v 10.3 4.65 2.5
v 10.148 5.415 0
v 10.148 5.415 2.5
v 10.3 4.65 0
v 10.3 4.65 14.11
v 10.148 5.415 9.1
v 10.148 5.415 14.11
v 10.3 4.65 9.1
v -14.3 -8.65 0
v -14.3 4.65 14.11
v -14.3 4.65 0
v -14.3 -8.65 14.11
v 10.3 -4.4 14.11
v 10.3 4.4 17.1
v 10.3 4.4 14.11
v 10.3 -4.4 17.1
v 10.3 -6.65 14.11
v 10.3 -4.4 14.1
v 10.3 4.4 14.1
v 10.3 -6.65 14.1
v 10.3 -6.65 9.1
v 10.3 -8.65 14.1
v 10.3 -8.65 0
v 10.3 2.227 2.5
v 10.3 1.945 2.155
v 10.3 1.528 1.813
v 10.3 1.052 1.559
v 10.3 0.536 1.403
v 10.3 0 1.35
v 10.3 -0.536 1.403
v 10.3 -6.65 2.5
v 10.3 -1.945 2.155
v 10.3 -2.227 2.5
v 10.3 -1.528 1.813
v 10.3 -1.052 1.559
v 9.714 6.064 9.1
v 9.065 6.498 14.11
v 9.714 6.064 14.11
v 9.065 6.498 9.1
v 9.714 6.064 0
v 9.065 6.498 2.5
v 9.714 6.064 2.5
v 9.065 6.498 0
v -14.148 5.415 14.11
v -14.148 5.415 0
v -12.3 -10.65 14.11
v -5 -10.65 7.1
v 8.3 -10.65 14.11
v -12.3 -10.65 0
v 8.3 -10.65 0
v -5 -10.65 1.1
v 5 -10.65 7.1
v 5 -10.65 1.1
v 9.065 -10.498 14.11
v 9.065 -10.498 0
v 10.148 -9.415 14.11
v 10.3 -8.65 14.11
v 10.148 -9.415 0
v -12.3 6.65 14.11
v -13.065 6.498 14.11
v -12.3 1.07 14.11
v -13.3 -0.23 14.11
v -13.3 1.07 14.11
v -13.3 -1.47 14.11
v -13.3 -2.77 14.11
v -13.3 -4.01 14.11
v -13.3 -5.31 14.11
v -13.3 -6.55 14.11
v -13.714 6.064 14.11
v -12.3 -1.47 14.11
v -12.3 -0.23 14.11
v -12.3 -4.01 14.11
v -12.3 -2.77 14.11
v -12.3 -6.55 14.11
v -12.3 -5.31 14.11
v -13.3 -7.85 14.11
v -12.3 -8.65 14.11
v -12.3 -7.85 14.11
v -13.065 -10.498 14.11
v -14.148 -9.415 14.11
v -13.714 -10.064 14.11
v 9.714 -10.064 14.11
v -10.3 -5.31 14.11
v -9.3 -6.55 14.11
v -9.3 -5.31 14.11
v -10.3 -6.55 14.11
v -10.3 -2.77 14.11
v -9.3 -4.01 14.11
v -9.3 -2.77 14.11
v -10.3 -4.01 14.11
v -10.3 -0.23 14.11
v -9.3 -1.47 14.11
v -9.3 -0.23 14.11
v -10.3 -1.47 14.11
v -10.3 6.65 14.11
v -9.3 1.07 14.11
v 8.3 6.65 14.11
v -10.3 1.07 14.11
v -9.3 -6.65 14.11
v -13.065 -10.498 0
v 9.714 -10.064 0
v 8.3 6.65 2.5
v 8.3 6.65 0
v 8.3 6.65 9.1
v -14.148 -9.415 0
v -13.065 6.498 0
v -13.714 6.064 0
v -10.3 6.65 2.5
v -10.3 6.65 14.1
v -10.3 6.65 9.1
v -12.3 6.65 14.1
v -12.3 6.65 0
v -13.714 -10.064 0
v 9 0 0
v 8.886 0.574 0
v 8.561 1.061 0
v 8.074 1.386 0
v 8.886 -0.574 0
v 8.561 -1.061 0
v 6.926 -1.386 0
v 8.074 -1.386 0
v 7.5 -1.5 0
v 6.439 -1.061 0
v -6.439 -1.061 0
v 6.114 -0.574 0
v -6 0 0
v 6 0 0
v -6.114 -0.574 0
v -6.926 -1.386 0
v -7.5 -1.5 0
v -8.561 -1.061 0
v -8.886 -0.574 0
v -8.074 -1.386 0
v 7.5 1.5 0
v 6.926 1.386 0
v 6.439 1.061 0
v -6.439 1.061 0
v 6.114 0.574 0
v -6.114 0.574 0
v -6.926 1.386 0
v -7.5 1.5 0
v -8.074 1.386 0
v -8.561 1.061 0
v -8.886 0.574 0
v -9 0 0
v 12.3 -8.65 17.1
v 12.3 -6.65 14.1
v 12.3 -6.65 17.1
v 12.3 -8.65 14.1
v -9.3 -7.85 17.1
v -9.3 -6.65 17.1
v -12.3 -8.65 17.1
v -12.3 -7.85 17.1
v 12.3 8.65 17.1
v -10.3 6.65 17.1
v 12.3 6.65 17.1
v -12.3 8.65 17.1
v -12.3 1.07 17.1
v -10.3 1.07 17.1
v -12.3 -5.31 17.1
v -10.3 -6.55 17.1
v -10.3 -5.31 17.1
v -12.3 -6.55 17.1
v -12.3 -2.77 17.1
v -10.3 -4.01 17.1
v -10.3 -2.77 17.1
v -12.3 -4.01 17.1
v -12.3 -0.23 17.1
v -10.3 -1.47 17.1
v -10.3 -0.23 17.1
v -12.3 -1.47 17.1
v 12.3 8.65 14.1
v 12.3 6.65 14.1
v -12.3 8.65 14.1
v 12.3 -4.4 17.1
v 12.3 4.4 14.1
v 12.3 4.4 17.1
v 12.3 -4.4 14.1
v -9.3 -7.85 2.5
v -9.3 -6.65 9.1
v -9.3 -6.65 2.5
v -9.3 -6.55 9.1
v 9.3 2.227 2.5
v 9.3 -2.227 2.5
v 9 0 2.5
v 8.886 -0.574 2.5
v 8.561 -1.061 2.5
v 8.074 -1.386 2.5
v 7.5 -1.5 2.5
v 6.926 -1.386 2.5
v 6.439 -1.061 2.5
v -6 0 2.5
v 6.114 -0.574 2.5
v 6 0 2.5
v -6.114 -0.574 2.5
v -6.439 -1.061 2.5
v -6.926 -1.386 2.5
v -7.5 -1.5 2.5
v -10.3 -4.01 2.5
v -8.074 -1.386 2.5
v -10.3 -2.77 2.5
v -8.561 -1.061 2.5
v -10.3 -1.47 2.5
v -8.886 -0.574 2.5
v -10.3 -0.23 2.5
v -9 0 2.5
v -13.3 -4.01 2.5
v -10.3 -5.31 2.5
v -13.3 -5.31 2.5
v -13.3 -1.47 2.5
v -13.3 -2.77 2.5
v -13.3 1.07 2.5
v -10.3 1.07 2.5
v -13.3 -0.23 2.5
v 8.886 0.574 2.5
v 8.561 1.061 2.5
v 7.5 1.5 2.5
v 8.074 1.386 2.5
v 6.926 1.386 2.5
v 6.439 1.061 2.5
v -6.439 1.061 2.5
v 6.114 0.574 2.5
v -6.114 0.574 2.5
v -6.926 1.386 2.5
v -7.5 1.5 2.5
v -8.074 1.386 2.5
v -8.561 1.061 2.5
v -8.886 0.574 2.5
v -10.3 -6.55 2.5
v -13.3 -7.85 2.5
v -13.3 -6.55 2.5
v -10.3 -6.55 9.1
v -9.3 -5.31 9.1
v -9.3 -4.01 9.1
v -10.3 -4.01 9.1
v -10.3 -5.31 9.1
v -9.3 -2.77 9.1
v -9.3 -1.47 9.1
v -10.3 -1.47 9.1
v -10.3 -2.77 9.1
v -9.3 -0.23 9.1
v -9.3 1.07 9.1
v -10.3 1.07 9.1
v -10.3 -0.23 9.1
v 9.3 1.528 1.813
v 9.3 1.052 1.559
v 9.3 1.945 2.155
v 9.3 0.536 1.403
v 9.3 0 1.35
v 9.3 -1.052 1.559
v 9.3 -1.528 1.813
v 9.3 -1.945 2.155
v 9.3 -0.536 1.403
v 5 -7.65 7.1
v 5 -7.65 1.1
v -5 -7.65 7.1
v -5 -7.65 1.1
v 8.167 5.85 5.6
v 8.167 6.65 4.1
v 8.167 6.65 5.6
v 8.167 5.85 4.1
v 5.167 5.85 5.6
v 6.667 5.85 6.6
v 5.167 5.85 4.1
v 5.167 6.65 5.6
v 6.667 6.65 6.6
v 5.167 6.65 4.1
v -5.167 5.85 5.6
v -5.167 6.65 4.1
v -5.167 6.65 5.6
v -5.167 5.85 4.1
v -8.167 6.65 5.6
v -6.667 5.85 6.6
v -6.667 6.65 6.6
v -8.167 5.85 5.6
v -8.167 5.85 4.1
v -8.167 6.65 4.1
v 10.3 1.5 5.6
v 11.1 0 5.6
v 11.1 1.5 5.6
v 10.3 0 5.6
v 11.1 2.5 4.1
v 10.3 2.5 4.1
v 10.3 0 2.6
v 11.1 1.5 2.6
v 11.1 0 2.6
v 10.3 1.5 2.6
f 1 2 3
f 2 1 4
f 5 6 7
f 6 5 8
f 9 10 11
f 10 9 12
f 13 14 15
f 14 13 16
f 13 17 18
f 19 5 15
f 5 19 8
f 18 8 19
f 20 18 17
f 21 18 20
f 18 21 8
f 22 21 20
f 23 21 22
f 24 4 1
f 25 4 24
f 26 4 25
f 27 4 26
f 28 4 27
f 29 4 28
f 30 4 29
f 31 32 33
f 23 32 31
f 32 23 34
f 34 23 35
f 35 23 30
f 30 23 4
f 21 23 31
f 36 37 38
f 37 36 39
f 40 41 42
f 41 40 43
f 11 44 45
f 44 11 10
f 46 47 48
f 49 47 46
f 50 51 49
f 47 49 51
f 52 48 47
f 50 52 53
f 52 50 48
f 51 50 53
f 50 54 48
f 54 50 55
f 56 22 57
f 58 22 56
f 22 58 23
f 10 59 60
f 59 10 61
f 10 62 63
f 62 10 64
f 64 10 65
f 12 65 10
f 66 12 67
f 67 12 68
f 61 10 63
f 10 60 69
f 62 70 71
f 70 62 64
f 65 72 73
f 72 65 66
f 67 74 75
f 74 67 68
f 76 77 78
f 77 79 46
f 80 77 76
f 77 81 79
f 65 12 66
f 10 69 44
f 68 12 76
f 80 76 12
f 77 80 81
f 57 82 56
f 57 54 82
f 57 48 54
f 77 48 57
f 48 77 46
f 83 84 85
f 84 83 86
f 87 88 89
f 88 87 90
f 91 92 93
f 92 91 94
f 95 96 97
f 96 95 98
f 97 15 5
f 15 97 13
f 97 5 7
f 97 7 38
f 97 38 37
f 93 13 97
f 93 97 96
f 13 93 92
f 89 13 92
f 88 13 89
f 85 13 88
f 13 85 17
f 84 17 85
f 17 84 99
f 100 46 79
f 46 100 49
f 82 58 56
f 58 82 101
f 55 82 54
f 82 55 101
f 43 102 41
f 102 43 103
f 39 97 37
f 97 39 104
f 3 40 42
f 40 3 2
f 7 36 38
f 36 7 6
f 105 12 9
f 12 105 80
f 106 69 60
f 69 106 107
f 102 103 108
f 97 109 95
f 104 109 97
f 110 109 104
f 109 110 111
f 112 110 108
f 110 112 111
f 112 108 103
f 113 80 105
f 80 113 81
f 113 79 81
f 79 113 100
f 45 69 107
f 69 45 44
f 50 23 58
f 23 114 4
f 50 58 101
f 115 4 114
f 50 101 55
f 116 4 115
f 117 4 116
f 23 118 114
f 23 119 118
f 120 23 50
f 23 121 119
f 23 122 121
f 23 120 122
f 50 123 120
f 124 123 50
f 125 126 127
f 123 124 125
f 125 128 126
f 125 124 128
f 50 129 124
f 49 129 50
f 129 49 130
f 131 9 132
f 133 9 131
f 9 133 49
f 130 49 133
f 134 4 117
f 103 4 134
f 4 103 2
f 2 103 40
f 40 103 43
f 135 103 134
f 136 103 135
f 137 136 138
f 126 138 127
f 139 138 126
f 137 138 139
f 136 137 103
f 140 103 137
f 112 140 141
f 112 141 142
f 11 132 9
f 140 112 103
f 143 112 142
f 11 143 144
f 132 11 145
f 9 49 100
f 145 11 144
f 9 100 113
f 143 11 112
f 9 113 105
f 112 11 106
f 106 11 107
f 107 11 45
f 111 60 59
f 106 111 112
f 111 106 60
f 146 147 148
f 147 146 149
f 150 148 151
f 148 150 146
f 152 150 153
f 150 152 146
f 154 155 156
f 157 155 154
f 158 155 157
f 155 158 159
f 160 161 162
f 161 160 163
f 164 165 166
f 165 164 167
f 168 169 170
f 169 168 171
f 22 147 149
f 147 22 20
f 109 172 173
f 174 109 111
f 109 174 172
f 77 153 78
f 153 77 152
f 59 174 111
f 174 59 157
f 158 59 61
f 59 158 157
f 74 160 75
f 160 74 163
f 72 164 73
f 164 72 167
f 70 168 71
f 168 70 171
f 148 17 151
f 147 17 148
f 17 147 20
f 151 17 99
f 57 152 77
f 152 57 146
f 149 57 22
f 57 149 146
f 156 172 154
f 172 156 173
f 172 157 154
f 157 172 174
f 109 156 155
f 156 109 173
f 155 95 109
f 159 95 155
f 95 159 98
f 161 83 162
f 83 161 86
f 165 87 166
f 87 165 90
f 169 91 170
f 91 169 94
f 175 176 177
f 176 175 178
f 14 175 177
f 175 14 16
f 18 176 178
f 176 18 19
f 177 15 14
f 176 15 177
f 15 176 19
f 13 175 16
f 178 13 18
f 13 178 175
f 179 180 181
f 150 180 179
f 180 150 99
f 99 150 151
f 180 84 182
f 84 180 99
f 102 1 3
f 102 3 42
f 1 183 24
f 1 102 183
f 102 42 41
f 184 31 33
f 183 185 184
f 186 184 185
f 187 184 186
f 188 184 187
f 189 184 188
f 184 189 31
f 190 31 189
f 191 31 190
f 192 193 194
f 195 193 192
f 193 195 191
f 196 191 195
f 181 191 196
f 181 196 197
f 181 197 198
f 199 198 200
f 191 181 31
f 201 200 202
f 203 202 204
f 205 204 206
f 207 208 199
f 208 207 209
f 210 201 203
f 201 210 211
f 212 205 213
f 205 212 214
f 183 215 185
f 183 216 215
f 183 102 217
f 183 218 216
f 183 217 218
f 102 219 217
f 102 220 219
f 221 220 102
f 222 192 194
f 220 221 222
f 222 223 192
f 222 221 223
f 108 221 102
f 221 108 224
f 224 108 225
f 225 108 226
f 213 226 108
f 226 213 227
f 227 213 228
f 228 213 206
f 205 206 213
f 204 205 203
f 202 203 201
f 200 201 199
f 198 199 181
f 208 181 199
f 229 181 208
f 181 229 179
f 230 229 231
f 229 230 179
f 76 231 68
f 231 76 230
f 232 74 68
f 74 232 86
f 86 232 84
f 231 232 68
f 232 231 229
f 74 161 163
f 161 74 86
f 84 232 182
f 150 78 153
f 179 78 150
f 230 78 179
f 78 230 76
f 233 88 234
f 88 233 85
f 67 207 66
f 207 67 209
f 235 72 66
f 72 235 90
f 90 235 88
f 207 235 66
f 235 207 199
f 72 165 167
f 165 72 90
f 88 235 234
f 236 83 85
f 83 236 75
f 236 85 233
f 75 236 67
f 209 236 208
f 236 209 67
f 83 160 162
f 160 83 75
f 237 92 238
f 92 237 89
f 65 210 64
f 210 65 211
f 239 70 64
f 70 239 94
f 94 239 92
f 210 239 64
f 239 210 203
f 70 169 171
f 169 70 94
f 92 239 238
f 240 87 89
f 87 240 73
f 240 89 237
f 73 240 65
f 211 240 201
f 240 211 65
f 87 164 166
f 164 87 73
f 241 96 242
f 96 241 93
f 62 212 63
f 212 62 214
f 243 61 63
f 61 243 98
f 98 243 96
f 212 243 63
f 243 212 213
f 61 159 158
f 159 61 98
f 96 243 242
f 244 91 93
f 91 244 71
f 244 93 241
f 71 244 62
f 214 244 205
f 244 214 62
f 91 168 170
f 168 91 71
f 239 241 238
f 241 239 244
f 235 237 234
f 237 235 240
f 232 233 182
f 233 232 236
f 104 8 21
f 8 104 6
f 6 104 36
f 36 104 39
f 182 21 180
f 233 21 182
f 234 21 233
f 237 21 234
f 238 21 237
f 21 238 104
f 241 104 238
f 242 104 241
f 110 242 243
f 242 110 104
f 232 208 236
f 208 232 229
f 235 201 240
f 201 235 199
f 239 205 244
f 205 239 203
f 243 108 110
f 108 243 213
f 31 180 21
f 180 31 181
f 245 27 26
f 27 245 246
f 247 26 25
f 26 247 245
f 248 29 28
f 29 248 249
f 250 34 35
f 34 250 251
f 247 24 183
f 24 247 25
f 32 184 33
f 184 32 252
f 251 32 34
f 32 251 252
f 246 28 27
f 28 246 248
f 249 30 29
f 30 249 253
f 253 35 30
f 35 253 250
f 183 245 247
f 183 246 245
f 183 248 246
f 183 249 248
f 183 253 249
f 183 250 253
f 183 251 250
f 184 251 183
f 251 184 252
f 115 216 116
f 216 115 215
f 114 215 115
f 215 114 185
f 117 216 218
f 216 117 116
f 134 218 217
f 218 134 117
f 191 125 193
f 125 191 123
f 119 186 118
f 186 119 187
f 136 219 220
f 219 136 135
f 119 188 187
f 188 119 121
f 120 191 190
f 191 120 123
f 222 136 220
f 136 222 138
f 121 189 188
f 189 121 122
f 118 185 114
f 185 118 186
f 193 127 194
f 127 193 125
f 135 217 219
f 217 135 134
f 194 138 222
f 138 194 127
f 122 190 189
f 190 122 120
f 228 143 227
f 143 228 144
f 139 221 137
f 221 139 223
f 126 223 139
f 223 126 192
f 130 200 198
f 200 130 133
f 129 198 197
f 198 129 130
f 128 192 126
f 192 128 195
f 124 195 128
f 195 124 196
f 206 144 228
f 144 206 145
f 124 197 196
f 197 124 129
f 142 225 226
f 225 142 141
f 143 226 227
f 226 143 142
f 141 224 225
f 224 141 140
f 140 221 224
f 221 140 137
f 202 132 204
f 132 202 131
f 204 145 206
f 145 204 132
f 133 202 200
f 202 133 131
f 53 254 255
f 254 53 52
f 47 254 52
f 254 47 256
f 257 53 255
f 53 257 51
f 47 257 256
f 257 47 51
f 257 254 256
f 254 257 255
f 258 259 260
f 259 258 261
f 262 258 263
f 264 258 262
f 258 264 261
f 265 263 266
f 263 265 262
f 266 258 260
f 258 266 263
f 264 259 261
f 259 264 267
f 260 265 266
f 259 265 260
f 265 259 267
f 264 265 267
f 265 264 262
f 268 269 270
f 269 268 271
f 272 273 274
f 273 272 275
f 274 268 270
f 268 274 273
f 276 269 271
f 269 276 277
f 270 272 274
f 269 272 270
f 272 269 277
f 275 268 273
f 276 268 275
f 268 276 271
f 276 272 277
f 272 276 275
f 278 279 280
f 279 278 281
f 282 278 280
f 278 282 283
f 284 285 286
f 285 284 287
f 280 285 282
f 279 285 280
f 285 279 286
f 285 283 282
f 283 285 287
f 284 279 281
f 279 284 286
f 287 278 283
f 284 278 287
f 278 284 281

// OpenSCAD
/*
 * VL53L0X V2 TOF Sensor Case - Open Design
 * 3D Printable holder for VL53L0X sensor with soldered pins
 * 
 * Creative open design with easy sensor insertion
 * - Open top for easy sensor placement
 * - Side slots for pin access
 * - Snap-fit retention tabs
 * - Clear visual guide for sensor placement
 */

// ==========================================
// CONFIGURATION PARAMETERS
// ==========================================

// PCB dimensions
pcb_length = 20.0;      // Length of PCB (mm)
pcb_width = 12.7;       // Width of PCB (mm)
pcb_thickness = 1.6;    // PCB thickness (mm)

// Pin configuration
pin_spacing = 2.54;     // Standard pin spacing (mm)
pin_count = 4;          // Number of pins (VCC, GND, SDA, SCL)
pin_diameter = 0.8;     // Pin diameter (mm)
pin_length = 10.0;      // Length of pins below PCB (mm)

// Sensor lens
lens_diameter = 4.5;    // Sensor lens diameter (mm)
lens_height = 1.0;      // Lens protrusion above PCB (mm)

// Case dimensions
wall_thickness = 2.0;   // Wall thickness (mm)
base_thickness = 2.5;   // Base thickness (mm)
side_wall_height = 3.0; // Height of side walls (mm)
corner_radius = 2.0;    // Rounded corners (mm)

// Clearances
pcb_clearance = 0.3;    // Clearance around PCB for easy insertion
pin_clearance = 0.5;    // Clearance around pins

// Mounting holes
mount_hole_diameter = 3.0;  // M3 screw hole
mount_hole_spacing = 15.0;   // Distance between mounting holes

// Retention tabs
tab_width = 3.0;        // Width of retention tabs
tab_thickness = 0.8;   // Thickness of tabs
tab_height = 1.5;      // Height tabs extend above PCB

// ==========================================
// CALCULATED DIMENSIONS
// ==========================================

total_length = pcb_length + (pcb_clearance * 2) + (wall_thickness * 2);
total_width = pcb_width + (pcb_clearance * 2) + (wall_thickness * 2);
base_height = base_thickness + pcb_thickness + pin_length;

// Pin positions (centered on PCB, along one edge)
pin_start_x = -(pin_count - 1) * pin_spacing / 2;
pin_y_position = -pcb_width / 2 - 1.5; // Pins on bottom edge

// ==========================================
// MAIN CASE BASE
// ==========================================

module rounded_rect(size, r) {
    translate([-size[0]/2, -size[1]/2, 0])
        minkowski() {
            cube([size[0] - r*2, size[1] - r*2, size[2]]);
            cylinder(r=r, h=0.01, $fn=16);
        }
}

module case_base() {
    // Main base with rounded corners
    rounded_rect([total_length, total_width, base_height], corner_radius);
    
    // Side walls (partial, not full height)
    translate([-total_length/2, -total_width/2, base_height])
        cube([total_length, wall_thickness, side_wall_height]);
    translate([-total_length/2, total_width/2 - wall_thickness, base_height])
        cube([total_length, wall_thickness, side_wall_height]);
    
    // Back wall (where pins exit)
    translate([-total_length/2, -total_width/2, base_height])
        cube([wall_thickness, total_width, side_wall_height]);
    
    // Front wall (partial, with lens opening)
    front_wall_width = total_width - lens_diameter - 4;
    translate([total_length/2 - wall_thickness, -front_wall_width/2, base_height])
        cube([wall_thickness, front_wall_width, side_wall_height]);
}

// ==========================================
// CUTOUTS AND OPENINGS
// ==========================================

module case_cutouts() {
    // PCB cavity (open top for easy insertion)
    translate([
        -pcb_length/2 - pcb_clearance,
        -pcb_width/2 - pcb_clearance,
        base_thickness
    ])
        cube([
            pcb_length + (pcb_clearance * 2),
            pcb_width + (pcb_clearance * 2),
            pcb_thickness + 5
        ]);
    
    // Sensor lens opening (front)
    translate([
        total_length/2 - wall_thickness - 1,
        0,
        base_thickness + pcb_thickness
    ])
        rotate([0, 90, 0])
            cylinder(h = wall_thickness + 2, d = lens_diameter + 1, $fn=32);
    
    // Pin exit slots (back wall)
    for (i = [0:pin_count-1]) {
        translate([
            -total_length/2 - 1,
            pin_y_position + (i * pin_spacing),
            base_thickness
        ])
            cube([
                wall_thickness + 2,
                pin_diameter + pin_clearance,
                pin_length + 5
            ]);
    }
    
    // Mounting holes
    translate([mount_hole_spacing/2, 0, -1])
        cylinder(h = base_thickness + 2, d = mount_hole_diameter, $fn=16);
    translate([-mount_hole_spacing/2, 0, -1])
        cylinder(h = base_thickness + 2, d = mount_hole_diameter, $fn=16);
    
    // Wire routing channel (optional)
    translate([0, -total_width/2 - 1, base_thickness + pcb_thickness])
        cube([10, 4, 6], center=true);
}

// ==========================================
// RETENTION TABS
// ==========================================

module retention_tabs() {
    // Front tabs (hold PCB in place)
    tab_positions = [
        [pcb_length/3, pcb_width/2 + pcb_clearance],
        [-pcb_length/3, pcb_width/2 + pcb_clearance]
    ];
    
    for (pos = tab_positions) {
        translate([pos[0], pos[1], base_thickness + pcb_thickness])
            rotate([90, 0, 0])
                linear_extrude(height = tab_thickness)
                    polygon([
                        [-tab_width/2, 0],
                        [tab_width/2, 0],
                        [tab_width/2, tab_height],
                        [0, tab_height + 1],
                        [-tab_width/2, tab_height]
                    ]);
    }
    
    // Side tabs
    translate([pcb_length/2 + pcb_clearance, 0, base_thickness + pcb_thickness])
        rotate([0, 90, 0])
            linear_extrude(height = tab_thickness)
                polygon([
                    [-tab_width/2, 0],
                    [tab_width/2, 0],
                    [tab_width/2, tab_height],
                    [0, tab_height + 1],
                    [-tab_width/2, tab_height]
                ]);
}

// ==========================================
// VISUAL GUIDES (optional, for reference)
// ==========================================

module pcb_outline() {
    %translate([-pcb_length/2, -pcb_width/2, base_thickness])
        color("green", 0.3)
            cube([pcb_length, pcb_width, pcb_thickness]);
    
    %translate([0, pcb_width/2 + 1, base_thickness + pcb_thickness])
        color("red", 0.5)
            cylinder(h = lens_height, d = lens_diameter, $fn=32);
}

// ==========================================
// MAIN CASE ASSEMBLY
// ==========================================

module vl53l0x_case() {
    difference() {
        case_base();
        case_cutouts();
    }
    
    // Add retention tabs
    retention_tabs();
    
    // Visual guide (comment out for final print)
    // pcb_outline();
}

// ==========================================
// RENDER
// ==========================================

vl53l0x_case();

// ==========================================
// INSTRUCTIONS
// ==========================================
/*
 * ASSEMBLY INSTRUCTIONS:
 * 
 * 1. Print the case with base flat on bed
 * 2. The case has an OPEN TOP - sensor slides in from above
 * 3. Place VL53L0X sensor into the cavity:
 *    - PCB sits on the base platform
 *    - Sensor lens faces forward (toward lens opening)
 *    - Pins point backward (toward pin slots)
 * 4. Pins will pass through slots in the back wall
 * 5. Retention tabs will hold the PCB in place
 * 6. Use M3 screws through mounting holes to attach
 * 
 * The design is intentionally open on top for easy insertion!
 */
